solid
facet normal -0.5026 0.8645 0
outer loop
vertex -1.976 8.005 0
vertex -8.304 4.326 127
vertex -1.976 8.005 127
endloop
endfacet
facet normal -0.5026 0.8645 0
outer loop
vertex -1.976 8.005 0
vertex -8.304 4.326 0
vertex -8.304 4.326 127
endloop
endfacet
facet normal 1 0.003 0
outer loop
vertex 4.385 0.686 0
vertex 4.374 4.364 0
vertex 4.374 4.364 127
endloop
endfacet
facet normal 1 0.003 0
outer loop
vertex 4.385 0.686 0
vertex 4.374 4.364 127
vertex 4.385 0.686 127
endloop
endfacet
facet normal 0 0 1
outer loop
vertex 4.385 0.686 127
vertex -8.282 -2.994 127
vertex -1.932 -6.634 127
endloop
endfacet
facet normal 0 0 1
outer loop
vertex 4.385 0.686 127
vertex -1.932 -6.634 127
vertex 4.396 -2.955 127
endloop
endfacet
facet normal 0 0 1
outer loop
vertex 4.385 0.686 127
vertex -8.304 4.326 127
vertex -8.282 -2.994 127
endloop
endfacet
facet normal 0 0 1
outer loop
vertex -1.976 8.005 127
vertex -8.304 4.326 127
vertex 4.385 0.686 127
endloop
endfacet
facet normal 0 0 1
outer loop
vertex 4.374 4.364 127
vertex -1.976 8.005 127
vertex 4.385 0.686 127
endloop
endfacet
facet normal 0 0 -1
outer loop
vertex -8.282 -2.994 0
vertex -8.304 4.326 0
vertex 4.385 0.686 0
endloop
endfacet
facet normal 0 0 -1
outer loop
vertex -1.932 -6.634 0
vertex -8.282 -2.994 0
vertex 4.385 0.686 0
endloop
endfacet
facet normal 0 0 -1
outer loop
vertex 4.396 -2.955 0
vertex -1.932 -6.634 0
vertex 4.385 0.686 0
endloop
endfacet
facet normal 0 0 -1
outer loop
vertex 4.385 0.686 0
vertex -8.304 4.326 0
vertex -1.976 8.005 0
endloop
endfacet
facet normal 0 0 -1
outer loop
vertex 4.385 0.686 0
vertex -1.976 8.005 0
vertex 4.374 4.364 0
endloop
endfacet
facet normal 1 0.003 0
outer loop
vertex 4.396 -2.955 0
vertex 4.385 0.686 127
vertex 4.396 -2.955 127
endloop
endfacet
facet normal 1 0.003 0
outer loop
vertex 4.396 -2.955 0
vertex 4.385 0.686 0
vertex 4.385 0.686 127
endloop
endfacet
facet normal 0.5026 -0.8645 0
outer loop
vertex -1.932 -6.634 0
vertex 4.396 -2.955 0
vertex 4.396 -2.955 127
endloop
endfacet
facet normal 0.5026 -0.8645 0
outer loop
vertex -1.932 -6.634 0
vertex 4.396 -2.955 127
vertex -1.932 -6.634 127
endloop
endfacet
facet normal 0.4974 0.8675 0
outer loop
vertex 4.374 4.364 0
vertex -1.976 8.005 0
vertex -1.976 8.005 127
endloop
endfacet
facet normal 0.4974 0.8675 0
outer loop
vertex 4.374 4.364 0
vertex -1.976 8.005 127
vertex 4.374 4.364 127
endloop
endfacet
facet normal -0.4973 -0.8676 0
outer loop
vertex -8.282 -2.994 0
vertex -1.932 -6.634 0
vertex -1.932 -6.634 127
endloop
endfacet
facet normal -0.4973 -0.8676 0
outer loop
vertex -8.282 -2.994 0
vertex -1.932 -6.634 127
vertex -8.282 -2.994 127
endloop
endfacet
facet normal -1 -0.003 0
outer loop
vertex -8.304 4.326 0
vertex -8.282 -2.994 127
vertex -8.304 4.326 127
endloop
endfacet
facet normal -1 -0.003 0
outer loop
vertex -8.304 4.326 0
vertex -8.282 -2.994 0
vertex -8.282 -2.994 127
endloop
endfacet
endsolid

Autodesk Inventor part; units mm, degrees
ref_plane "YZ Plane" through (0, 0, 0) normal (1, 0, 0) x (0, 1, 0)
ref_plane "XZ Plane" through (0, 0, 0) normal (0, 1, 0) x (-1, 0, 0)
ref_plane "XY Plane" through (0, 0, 0) normal (0, 0, 1) x (1, 0, 0)
sketch "Sketch1" plane through (0, 0, 0) normal (0, 0, 1) x (1, 0, 0)
  line L0 (-1.9536, 0.6855) -> (4.3964, 0.6855)
  line L1 (4.3964, -2.9551) -> (-1.9315, -6.6341)
  line L2 (-1.9315, -6.6341) -> (-8.2815, -2.9935)
  line L3 (-8.2815, -2.9935) -> (-8.3036, 4.3261)
  line L4 (-8.3036, 4.3261) -> (-1.9757, 8.0051)
  line L5 (-1.9757, 8.0051) -> (4.3743, 4.3644)
  line L6 (4.3743, 4.3644) -> (4.3964, -2.9551)
  dimension "d0" = 6.35
extrude "Extrusion1" add sketch "Sketch1" along normal blind 127
properties part number "Hex Shaft"
